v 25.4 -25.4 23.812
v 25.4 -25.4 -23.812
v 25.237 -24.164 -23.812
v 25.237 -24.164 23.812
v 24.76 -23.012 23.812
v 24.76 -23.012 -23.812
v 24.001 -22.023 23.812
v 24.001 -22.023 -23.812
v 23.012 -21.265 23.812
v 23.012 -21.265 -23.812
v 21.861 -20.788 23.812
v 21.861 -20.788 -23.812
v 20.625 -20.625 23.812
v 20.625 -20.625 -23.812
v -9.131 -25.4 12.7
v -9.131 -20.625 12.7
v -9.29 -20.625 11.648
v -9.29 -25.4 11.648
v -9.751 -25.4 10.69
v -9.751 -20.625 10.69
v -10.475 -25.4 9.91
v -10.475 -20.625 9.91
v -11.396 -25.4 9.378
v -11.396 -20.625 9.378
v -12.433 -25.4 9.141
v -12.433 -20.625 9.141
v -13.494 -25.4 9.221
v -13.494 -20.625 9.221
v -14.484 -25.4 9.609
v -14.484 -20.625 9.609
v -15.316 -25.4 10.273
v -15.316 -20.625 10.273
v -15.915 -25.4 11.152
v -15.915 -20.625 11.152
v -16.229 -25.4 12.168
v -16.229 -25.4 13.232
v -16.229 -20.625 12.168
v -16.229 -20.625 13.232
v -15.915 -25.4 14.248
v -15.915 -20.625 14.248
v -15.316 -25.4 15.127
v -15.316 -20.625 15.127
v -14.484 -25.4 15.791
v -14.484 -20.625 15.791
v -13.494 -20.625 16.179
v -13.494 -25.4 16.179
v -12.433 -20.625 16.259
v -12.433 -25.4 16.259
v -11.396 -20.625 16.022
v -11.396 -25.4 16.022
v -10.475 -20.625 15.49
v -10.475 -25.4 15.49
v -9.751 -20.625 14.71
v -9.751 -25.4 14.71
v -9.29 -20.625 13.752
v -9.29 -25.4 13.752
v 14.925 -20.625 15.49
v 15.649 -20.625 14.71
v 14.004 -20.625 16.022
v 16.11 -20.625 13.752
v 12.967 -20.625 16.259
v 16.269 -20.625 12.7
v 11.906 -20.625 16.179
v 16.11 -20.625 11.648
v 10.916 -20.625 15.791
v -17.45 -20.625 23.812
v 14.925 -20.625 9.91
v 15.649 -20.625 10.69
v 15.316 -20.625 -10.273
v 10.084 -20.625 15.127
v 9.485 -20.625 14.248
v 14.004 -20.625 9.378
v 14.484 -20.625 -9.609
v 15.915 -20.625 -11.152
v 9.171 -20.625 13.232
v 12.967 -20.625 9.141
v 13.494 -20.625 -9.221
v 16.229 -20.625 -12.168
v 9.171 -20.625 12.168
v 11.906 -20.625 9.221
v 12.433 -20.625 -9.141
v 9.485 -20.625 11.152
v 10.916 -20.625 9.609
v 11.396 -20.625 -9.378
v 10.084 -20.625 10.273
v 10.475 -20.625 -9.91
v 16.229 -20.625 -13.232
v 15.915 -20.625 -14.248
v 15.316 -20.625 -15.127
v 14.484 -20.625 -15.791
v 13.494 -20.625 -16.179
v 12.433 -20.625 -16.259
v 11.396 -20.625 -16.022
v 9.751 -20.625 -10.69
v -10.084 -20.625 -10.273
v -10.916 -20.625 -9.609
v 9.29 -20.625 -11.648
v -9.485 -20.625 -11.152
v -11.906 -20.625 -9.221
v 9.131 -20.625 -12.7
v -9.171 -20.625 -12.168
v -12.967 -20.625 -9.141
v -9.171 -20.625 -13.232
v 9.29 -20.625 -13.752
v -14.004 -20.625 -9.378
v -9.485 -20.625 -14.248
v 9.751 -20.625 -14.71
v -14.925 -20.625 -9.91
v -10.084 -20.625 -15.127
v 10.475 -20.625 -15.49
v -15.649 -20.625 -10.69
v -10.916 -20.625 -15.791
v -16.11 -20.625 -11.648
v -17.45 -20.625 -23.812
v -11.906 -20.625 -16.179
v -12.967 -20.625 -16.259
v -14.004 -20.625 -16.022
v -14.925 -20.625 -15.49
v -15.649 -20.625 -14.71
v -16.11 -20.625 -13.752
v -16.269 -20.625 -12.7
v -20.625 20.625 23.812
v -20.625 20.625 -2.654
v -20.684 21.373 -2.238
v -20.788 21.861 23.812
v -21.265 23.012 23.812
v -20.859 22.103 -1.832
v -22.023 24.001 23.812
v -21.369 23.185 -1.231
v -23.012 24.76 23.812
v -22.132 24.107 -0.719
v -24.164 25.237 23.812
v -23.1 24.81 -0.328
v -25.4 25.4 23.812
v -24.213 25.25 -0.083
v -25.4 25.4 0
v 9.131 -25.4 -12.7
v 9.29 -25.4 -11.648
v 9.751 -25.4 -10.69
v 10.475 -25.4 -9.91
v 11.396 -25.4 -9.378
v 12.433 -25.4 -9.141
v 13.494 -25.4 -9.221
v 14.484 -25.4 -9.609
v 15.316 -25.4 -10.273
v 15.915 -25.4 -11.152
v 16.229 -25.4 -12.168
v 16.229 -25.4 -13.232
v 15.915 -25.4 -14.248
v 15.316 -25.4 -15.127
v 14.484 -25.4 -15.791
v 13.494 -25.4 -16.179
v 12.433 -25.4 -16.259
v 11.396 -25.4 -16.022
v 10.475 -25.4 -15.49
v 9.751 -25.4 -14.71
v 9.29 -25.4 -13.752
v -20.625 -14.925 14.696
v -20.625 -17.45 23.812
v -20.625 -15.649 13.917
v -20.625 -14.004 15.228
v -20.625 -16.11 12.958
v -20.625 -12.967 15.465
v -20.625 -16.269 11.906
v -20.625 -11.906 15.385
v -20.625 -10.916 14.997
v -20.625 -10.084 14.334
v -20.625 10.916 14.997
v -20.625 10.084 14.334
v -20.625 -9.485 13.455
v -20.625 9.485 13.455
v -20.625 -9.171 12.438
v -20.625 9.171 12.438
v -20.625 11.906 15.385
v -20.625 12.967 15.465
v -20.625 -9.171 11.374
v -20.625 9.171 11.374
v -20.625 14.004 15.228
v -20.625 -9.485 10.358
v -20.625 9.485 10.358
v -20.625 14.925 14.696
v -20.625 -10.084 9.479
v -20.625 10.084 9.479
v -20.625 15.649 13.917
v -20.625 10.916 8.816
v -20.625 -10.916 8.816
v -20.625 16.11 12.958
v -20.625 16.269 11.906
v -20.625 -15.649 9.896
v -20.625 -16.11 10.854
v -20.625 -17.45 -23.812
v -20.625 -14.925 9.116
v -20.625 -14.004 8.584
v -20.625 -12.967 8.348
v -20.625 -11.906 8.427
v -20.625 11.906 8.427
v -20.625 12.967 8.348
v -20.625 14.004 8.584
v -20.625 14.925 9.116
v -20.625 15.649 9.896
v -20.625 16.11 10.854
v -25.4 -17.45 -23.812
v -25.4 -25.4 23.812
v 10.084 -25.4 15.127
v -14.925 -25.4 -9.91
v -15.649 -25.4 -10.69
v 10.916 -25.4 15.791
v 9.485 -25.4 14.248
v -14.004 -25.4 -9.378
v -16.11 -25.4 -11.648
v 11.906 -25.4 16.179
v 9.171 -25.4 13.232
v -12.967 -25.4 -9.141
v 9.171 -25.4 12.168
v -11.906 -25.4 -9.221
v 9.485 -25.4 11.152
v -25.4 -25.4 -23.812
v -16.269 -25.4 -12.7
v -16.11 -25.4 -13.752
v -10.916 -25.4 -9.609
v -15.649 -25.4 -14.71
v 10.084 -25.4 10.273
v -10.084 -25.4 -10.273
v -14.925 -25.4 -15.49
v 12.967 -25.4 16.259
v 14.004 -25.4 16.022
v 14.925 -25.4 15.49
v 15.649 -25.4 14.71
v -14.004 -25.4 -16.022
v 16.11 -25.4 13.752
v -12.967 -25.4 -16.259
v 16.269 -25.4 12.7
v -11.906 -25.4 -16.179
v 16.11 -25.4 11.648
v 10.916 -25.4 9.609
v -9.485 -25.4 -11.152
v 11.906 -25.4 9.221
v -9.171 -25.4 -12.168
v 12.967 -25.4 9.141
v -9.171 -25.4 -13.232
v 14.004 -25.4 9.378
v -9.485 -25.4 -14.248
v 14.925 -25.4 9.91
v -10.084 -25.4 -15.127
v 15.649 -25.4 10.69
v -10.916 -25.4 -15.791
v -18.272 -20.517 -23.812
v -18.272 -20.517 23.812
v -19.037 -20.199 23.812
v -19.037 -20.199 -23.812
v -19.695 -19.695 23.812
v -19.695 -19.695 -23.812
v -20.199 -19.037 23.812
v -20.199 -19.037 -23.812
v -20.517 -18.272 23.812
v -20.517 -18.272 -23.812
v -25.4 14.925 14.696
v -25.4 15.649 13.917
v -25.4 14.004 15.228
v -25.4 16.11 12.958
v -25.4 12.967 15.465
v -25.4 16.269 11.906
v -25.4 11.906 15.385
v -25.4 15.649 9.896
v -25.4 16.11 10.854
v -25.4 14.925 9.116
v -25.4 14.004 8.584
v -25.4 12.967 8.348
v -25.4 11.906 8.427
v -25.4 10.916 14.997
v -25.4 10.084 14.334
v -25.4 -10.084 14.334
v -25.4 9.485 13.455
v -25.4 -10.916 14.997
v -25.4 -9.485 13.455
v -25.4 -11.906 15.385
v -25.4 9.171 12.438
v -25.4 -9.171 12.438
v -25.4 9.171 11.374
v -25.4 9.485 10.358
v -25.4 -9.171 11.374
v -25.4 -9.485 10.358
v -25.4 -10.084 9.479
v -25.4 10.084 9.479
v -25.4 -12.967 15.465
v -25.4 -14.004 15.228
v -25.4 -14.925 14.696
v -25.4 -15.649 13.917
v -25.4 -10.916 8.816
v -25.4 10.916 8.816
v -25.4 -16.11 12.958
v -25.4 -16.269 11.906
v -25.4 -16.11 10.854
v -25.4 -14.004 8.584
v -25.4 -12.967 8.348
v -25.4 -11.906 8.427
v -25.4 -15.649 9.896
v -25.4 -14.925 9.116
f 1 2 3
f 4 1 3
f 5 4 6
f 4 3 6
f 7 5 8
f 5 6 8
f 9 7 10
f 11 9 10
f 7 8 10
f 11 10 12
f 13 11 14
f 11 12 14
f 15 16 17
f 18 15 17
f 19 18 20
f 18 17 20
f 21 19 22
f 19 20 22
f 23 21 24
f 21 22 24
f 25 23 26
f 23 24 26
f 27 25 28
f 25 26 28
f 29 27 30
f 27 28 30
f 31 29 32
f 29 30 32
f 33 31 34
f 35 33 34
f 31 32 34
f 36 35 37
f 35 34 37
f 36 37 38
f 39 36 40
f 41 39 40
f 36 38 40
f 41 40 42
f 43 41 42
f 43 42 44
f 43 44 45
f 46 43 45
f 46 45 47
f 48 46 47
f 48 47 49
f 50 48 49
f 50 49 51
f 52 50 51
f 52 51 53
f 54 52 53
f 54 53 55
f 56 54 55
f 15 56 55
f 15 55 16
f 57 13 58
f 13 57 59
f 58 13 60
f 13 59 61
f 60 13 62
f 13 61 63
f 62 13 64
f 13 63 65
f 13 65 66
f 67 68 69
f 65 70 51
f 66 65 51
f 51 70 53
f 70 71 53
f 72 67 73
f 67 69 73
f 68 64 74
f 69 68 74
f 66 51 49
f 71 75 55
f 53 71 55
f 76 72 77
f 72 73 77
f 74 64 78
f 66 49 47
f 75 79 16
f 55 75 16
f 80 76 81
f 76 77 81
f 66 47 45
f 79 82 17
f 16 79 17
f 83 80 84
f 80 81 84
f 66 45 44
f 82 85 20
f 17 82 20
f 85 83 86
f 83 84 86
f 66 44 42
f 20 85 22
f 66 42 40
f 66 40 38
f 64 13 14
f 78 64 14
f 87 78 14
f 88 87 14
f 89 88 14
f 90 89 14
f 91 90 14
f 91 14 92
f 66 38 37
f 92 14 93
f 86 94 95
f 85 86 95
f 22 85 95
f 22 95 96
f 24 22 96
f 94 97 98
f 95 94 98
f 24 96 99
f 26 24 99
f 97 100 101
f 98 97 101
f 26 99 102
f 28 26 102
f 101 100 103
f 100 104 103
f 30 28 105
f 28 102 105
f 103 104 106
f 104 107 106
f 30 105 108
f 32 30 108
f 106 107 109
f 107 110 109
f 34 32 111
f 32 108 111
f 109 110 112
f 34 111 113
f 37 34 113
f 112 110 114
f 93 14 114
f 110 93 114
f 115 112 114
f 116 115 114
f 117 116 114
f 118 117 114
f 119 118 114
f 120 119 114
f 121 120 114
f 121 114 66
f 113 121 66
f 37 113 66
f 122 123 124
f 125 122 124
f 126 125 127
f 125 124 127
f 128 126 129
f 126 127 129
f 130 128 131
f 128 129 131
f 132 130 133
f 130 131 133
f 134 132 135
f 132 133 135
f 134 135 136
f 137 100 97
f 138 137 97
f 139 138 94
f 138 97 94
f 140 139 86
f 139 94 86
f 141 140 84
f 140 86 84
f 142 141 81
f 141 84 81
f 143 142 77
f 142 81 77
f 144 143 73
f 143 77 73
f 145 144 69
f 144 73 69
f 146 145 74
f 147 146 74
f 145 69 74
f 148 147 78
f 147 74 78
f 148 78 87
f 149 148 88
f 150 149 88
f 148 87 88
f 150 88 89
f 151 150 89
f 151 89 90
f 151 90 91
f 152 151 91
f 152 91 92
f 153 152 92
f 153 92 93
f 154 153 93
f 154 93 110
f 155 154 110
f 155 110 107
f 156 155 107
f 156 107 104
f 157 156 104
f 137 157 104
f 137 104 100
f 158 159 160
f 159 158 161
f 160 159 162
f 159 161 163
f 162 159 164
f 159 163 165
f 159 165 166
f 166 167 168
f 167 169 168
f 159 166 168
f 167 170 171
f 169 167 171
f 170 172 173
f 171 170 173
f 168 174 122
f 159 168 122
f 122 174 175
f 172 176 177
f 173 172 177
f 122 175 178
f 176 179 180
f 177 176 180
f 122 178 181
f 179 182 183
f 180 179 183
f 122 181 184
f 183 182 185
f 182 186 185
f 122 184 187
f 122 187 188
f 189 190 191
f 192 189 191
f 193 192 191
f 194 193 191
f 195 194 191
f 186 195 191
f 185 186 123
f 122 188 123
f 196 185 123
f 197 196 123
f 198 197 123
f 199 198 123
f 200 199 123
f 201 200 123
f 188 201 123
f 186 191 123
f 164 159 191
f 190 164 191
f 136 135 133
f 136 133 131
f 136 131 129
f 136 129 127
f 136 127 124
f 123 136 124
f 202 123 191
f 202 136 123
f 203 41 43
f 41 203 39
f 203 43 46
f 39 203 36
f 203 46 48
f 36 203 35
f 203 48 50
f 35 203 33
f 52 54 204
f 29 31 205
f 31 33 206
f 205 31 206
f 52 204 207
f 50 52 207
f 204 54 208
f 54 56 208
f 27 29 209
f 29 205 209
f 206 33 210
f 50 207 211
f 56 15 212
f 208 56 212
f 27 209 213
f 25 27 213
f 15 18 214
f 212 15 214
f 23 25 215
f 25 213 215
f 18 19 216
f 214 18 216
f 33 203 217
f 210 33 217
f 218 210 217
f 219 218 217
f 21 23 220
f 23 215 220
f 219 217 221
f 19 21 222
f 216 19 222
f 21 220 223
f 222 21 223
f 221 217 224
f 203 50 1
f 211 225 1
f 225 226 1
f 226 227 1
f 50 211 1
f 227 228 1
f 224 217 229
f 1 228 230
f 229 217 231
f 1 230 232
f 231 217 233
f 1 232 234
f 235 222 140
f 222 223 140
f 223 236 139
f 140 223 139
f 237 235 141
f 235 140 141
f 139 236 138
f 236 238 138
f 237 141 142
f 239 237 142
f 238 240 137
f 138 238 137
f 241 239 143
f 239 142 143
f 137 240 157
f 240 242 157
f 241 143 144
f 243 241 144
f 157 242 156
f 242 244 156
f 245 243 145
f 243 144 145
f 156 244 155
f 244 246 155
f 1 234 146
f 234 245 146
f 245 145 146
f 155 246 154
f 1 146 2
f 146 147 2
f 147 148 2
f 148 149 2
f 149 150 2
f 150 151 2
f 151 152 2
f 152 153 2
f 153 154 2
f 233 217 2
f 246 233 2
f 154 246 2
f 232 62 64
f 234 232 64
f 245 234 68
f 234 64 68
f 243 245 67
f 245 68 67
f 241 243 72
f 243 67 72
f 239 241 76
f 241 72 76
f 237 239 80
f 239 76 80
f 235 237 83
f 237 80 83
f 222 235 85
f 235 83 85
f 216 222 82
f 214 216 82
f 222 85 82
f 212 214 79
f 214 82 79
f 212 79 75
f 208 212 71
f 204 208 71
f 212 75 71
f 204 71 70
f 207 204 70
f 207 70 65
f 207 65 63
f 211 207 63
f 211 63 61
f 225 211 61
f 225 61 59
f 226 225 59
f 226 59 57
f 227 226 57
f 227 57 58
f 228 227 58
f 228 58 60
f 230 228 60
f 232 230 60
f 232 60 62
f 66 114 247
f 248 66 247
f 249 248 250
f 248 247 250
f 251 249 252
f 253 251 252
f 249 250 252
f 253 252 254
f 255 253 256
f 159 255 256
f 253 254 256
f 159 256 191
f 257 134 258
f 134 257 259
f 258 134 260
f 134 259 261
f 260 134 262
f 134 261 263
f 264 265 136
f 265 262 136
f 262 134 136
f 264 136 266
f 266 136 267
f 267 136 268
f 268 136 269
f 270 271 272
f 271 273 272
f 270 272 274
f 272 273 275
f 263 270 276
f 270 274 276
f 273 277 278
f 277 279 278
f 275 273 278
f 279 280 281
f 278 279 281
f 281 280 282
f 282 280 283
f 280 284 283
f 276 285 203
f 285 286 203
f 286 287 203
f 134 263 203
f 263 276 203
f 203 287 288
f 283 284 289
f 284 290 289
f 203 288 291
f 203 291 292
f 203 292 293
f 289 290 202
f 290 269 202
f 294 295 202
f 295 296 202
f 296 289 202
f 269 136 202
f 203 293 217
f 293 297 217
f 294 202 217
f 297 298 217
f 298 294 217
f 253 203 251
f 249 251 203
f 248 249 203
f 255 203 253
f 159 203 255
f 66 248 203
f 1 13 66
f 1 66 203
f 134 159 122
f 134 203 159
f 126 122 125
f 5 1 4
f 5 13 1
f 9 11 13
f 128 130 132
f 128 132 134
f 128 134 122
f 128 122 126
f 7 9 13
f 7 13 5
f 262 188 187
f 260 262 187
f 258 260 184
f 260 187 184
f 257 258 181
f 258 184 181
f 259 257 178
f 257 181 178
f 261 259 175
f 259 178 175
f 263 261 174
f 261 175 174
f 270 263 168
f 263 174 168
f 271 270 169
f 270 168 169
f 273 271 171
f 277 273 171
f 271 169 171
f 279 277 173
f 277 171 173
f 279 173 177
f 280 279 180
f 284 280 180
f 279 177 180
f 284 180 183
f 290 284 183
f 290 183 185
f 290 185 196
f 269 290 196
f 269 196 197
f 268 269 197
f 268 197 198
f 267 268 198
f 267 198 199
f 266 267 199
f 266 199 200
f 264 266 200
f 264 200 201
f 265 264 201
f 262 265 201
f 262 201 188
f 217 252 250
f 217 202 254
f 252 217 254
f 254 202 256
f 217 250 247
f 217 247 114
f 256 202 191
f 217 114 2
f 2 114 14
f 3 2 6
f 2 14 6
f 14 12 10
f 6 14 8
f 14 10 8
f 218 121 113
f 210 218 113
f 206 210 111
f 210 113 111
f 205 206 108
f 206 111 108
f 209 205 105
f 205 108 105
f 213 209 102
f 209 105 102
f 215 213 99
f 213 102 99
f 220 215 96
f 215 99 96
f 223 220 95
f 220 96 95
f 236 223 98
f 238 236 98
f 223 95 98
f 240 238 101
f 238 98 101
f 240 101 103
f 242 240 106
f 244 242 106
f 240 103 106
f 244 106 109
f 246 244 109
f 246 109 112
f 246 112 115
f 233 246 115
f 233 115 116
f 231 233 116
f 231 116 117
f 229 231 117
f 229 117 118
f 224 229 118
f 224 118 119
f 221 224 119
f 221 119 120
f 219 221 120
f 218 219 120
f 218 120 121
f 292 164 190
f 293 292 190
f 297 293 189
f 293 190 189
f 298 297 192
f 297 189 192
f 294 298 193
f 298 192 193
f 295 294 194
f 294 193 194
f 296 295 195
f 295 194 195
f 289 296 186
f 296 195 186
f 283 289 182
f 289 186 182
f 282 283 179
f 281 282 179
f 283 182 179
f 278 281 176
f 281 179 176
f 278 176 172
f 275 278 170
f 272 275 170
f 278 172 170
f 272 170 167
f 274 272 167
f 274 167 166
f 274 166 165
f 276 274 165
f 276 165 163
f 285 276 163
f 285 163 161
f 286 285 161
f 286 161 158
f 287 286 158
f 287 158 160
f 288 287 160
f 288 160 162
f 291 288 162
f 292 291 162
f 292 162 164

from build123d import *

# Parameters (mm, degrees)
BOSS_EXTRUDE1_DEPTH      = 23.8125
BOSS_EXTRUDE1_DEPTH_BACK = 23.8125
CUT_EXTRUDE1_DEPTH       = 58.710288262
CUT_EXTRUDE1_DEPTH_BACK  = 58.710288262
SKETCH6_R                = 3.5687
CUT_EXTRUDE2_DEPTH       = 58.710288262
SKETCH7_R                = 3.5687
CUT_EXTRUDE3_DEPTH       = 58.710288262


with BuildPart() as part:
    # Sketch4 → Boss-Extrude1 (new, two sides: drawn at the far end of the back side and taken through both)
    with BuildSketch(Plane.XY.offset(-BOSS_EXTRUDE1_DEPTH_BACK)):
        with BuildLine():
            Line((-25.4, 25.4), (-25.4, -25.4))
            Line((-25.4, -25.4), (25.4, -25.4))
            ThreePointArc((25.4, -25.4), (24.001376302, -22.023423698), (20.6248, -20.6248))
            Line((20.6248, -20.6248), (-17.4498, -20.6248))
            ThreePointArc((-17.4498, -20.6248), (-19.69486403, -19.69486403), (-20.6248, -17.4498))
            Line((-20.6248, -17.4498), (-20.6248, 20.6248))
            ThreePointArc((-20.6248, 20.6248), (-22.023423698, 24.001376302), (-25.4, 25.4))
        make_face()
    extrude(amount=BOSS_EXTRUDE1_DEPTH + BOSS_EXTRUDE1_DEPTH_BACK)

    # Sketch5 → Cut-Extrude1 (cut, two sides: drawn at the far end of the back side and taken through both)
    with BuildSketch(Plane(origin=(-20.6248, 0, 0), x_dir=(0, 0, -1), z_dir=(1, 0, 0)).offset(-CUT_EXTRUDE1_DEPTH_BACK)):
        Polygon((23.8125, 25.4), (0, 25.4), (23.8125, -17.4498), align=None)
    extrude(amount=CUT_EXTRUDE1_DEPTH + CUT_EXTRUDE1_DEPTH_BACK, mode=Mode.SUBTRACT)

    # Sketch6 → Cut-Extrude2 (cut, through all)
    with BuildSketch(Plane(origin=(-20.6248, 0, 0), x_dir=(0, 0, -1), z_dir=(1, 0, 0))):
        with Locations(Location((-11.90625, 12.7, 0), (0, 0, 90))):
            Circle(SKETCH6_R)
        with Locations(Location((-11.90625, -12.7, 0), (0, 0, 270))):
            Circle(SKETCH6_R)
    extrude(amount=-CUT_EXTRUDE2_DEPTH, mode=Mode.SUBTRACT)

    # Sketch7 → Cut-Extrude3 (cut, through all)
    with BuildSketch(Plane(origin=(0, -20.6248, 0), x_dir=(1, 0, 0), z_dir=(0, 1, 0))):
        with Locations(Location((-12.7, 12.7, 0), (0, 0, 180))):
            Circle(SKETCH7_R)
        with Locations(Location((12.7, 12.7, 0), (0, 0, 180))):
            Circle(SKETCH7_R)
        with Locations((12.7, -12.7)):
            Circle(SKETCH7_R)
        with Locations((-12.7, -12.7)):
            Circle(SKETCH7_R)
    extrude(amount=-CUT_EXTRUDE3_DEPTH, mode=Mode.SUBTRACT)


solid = part.part
